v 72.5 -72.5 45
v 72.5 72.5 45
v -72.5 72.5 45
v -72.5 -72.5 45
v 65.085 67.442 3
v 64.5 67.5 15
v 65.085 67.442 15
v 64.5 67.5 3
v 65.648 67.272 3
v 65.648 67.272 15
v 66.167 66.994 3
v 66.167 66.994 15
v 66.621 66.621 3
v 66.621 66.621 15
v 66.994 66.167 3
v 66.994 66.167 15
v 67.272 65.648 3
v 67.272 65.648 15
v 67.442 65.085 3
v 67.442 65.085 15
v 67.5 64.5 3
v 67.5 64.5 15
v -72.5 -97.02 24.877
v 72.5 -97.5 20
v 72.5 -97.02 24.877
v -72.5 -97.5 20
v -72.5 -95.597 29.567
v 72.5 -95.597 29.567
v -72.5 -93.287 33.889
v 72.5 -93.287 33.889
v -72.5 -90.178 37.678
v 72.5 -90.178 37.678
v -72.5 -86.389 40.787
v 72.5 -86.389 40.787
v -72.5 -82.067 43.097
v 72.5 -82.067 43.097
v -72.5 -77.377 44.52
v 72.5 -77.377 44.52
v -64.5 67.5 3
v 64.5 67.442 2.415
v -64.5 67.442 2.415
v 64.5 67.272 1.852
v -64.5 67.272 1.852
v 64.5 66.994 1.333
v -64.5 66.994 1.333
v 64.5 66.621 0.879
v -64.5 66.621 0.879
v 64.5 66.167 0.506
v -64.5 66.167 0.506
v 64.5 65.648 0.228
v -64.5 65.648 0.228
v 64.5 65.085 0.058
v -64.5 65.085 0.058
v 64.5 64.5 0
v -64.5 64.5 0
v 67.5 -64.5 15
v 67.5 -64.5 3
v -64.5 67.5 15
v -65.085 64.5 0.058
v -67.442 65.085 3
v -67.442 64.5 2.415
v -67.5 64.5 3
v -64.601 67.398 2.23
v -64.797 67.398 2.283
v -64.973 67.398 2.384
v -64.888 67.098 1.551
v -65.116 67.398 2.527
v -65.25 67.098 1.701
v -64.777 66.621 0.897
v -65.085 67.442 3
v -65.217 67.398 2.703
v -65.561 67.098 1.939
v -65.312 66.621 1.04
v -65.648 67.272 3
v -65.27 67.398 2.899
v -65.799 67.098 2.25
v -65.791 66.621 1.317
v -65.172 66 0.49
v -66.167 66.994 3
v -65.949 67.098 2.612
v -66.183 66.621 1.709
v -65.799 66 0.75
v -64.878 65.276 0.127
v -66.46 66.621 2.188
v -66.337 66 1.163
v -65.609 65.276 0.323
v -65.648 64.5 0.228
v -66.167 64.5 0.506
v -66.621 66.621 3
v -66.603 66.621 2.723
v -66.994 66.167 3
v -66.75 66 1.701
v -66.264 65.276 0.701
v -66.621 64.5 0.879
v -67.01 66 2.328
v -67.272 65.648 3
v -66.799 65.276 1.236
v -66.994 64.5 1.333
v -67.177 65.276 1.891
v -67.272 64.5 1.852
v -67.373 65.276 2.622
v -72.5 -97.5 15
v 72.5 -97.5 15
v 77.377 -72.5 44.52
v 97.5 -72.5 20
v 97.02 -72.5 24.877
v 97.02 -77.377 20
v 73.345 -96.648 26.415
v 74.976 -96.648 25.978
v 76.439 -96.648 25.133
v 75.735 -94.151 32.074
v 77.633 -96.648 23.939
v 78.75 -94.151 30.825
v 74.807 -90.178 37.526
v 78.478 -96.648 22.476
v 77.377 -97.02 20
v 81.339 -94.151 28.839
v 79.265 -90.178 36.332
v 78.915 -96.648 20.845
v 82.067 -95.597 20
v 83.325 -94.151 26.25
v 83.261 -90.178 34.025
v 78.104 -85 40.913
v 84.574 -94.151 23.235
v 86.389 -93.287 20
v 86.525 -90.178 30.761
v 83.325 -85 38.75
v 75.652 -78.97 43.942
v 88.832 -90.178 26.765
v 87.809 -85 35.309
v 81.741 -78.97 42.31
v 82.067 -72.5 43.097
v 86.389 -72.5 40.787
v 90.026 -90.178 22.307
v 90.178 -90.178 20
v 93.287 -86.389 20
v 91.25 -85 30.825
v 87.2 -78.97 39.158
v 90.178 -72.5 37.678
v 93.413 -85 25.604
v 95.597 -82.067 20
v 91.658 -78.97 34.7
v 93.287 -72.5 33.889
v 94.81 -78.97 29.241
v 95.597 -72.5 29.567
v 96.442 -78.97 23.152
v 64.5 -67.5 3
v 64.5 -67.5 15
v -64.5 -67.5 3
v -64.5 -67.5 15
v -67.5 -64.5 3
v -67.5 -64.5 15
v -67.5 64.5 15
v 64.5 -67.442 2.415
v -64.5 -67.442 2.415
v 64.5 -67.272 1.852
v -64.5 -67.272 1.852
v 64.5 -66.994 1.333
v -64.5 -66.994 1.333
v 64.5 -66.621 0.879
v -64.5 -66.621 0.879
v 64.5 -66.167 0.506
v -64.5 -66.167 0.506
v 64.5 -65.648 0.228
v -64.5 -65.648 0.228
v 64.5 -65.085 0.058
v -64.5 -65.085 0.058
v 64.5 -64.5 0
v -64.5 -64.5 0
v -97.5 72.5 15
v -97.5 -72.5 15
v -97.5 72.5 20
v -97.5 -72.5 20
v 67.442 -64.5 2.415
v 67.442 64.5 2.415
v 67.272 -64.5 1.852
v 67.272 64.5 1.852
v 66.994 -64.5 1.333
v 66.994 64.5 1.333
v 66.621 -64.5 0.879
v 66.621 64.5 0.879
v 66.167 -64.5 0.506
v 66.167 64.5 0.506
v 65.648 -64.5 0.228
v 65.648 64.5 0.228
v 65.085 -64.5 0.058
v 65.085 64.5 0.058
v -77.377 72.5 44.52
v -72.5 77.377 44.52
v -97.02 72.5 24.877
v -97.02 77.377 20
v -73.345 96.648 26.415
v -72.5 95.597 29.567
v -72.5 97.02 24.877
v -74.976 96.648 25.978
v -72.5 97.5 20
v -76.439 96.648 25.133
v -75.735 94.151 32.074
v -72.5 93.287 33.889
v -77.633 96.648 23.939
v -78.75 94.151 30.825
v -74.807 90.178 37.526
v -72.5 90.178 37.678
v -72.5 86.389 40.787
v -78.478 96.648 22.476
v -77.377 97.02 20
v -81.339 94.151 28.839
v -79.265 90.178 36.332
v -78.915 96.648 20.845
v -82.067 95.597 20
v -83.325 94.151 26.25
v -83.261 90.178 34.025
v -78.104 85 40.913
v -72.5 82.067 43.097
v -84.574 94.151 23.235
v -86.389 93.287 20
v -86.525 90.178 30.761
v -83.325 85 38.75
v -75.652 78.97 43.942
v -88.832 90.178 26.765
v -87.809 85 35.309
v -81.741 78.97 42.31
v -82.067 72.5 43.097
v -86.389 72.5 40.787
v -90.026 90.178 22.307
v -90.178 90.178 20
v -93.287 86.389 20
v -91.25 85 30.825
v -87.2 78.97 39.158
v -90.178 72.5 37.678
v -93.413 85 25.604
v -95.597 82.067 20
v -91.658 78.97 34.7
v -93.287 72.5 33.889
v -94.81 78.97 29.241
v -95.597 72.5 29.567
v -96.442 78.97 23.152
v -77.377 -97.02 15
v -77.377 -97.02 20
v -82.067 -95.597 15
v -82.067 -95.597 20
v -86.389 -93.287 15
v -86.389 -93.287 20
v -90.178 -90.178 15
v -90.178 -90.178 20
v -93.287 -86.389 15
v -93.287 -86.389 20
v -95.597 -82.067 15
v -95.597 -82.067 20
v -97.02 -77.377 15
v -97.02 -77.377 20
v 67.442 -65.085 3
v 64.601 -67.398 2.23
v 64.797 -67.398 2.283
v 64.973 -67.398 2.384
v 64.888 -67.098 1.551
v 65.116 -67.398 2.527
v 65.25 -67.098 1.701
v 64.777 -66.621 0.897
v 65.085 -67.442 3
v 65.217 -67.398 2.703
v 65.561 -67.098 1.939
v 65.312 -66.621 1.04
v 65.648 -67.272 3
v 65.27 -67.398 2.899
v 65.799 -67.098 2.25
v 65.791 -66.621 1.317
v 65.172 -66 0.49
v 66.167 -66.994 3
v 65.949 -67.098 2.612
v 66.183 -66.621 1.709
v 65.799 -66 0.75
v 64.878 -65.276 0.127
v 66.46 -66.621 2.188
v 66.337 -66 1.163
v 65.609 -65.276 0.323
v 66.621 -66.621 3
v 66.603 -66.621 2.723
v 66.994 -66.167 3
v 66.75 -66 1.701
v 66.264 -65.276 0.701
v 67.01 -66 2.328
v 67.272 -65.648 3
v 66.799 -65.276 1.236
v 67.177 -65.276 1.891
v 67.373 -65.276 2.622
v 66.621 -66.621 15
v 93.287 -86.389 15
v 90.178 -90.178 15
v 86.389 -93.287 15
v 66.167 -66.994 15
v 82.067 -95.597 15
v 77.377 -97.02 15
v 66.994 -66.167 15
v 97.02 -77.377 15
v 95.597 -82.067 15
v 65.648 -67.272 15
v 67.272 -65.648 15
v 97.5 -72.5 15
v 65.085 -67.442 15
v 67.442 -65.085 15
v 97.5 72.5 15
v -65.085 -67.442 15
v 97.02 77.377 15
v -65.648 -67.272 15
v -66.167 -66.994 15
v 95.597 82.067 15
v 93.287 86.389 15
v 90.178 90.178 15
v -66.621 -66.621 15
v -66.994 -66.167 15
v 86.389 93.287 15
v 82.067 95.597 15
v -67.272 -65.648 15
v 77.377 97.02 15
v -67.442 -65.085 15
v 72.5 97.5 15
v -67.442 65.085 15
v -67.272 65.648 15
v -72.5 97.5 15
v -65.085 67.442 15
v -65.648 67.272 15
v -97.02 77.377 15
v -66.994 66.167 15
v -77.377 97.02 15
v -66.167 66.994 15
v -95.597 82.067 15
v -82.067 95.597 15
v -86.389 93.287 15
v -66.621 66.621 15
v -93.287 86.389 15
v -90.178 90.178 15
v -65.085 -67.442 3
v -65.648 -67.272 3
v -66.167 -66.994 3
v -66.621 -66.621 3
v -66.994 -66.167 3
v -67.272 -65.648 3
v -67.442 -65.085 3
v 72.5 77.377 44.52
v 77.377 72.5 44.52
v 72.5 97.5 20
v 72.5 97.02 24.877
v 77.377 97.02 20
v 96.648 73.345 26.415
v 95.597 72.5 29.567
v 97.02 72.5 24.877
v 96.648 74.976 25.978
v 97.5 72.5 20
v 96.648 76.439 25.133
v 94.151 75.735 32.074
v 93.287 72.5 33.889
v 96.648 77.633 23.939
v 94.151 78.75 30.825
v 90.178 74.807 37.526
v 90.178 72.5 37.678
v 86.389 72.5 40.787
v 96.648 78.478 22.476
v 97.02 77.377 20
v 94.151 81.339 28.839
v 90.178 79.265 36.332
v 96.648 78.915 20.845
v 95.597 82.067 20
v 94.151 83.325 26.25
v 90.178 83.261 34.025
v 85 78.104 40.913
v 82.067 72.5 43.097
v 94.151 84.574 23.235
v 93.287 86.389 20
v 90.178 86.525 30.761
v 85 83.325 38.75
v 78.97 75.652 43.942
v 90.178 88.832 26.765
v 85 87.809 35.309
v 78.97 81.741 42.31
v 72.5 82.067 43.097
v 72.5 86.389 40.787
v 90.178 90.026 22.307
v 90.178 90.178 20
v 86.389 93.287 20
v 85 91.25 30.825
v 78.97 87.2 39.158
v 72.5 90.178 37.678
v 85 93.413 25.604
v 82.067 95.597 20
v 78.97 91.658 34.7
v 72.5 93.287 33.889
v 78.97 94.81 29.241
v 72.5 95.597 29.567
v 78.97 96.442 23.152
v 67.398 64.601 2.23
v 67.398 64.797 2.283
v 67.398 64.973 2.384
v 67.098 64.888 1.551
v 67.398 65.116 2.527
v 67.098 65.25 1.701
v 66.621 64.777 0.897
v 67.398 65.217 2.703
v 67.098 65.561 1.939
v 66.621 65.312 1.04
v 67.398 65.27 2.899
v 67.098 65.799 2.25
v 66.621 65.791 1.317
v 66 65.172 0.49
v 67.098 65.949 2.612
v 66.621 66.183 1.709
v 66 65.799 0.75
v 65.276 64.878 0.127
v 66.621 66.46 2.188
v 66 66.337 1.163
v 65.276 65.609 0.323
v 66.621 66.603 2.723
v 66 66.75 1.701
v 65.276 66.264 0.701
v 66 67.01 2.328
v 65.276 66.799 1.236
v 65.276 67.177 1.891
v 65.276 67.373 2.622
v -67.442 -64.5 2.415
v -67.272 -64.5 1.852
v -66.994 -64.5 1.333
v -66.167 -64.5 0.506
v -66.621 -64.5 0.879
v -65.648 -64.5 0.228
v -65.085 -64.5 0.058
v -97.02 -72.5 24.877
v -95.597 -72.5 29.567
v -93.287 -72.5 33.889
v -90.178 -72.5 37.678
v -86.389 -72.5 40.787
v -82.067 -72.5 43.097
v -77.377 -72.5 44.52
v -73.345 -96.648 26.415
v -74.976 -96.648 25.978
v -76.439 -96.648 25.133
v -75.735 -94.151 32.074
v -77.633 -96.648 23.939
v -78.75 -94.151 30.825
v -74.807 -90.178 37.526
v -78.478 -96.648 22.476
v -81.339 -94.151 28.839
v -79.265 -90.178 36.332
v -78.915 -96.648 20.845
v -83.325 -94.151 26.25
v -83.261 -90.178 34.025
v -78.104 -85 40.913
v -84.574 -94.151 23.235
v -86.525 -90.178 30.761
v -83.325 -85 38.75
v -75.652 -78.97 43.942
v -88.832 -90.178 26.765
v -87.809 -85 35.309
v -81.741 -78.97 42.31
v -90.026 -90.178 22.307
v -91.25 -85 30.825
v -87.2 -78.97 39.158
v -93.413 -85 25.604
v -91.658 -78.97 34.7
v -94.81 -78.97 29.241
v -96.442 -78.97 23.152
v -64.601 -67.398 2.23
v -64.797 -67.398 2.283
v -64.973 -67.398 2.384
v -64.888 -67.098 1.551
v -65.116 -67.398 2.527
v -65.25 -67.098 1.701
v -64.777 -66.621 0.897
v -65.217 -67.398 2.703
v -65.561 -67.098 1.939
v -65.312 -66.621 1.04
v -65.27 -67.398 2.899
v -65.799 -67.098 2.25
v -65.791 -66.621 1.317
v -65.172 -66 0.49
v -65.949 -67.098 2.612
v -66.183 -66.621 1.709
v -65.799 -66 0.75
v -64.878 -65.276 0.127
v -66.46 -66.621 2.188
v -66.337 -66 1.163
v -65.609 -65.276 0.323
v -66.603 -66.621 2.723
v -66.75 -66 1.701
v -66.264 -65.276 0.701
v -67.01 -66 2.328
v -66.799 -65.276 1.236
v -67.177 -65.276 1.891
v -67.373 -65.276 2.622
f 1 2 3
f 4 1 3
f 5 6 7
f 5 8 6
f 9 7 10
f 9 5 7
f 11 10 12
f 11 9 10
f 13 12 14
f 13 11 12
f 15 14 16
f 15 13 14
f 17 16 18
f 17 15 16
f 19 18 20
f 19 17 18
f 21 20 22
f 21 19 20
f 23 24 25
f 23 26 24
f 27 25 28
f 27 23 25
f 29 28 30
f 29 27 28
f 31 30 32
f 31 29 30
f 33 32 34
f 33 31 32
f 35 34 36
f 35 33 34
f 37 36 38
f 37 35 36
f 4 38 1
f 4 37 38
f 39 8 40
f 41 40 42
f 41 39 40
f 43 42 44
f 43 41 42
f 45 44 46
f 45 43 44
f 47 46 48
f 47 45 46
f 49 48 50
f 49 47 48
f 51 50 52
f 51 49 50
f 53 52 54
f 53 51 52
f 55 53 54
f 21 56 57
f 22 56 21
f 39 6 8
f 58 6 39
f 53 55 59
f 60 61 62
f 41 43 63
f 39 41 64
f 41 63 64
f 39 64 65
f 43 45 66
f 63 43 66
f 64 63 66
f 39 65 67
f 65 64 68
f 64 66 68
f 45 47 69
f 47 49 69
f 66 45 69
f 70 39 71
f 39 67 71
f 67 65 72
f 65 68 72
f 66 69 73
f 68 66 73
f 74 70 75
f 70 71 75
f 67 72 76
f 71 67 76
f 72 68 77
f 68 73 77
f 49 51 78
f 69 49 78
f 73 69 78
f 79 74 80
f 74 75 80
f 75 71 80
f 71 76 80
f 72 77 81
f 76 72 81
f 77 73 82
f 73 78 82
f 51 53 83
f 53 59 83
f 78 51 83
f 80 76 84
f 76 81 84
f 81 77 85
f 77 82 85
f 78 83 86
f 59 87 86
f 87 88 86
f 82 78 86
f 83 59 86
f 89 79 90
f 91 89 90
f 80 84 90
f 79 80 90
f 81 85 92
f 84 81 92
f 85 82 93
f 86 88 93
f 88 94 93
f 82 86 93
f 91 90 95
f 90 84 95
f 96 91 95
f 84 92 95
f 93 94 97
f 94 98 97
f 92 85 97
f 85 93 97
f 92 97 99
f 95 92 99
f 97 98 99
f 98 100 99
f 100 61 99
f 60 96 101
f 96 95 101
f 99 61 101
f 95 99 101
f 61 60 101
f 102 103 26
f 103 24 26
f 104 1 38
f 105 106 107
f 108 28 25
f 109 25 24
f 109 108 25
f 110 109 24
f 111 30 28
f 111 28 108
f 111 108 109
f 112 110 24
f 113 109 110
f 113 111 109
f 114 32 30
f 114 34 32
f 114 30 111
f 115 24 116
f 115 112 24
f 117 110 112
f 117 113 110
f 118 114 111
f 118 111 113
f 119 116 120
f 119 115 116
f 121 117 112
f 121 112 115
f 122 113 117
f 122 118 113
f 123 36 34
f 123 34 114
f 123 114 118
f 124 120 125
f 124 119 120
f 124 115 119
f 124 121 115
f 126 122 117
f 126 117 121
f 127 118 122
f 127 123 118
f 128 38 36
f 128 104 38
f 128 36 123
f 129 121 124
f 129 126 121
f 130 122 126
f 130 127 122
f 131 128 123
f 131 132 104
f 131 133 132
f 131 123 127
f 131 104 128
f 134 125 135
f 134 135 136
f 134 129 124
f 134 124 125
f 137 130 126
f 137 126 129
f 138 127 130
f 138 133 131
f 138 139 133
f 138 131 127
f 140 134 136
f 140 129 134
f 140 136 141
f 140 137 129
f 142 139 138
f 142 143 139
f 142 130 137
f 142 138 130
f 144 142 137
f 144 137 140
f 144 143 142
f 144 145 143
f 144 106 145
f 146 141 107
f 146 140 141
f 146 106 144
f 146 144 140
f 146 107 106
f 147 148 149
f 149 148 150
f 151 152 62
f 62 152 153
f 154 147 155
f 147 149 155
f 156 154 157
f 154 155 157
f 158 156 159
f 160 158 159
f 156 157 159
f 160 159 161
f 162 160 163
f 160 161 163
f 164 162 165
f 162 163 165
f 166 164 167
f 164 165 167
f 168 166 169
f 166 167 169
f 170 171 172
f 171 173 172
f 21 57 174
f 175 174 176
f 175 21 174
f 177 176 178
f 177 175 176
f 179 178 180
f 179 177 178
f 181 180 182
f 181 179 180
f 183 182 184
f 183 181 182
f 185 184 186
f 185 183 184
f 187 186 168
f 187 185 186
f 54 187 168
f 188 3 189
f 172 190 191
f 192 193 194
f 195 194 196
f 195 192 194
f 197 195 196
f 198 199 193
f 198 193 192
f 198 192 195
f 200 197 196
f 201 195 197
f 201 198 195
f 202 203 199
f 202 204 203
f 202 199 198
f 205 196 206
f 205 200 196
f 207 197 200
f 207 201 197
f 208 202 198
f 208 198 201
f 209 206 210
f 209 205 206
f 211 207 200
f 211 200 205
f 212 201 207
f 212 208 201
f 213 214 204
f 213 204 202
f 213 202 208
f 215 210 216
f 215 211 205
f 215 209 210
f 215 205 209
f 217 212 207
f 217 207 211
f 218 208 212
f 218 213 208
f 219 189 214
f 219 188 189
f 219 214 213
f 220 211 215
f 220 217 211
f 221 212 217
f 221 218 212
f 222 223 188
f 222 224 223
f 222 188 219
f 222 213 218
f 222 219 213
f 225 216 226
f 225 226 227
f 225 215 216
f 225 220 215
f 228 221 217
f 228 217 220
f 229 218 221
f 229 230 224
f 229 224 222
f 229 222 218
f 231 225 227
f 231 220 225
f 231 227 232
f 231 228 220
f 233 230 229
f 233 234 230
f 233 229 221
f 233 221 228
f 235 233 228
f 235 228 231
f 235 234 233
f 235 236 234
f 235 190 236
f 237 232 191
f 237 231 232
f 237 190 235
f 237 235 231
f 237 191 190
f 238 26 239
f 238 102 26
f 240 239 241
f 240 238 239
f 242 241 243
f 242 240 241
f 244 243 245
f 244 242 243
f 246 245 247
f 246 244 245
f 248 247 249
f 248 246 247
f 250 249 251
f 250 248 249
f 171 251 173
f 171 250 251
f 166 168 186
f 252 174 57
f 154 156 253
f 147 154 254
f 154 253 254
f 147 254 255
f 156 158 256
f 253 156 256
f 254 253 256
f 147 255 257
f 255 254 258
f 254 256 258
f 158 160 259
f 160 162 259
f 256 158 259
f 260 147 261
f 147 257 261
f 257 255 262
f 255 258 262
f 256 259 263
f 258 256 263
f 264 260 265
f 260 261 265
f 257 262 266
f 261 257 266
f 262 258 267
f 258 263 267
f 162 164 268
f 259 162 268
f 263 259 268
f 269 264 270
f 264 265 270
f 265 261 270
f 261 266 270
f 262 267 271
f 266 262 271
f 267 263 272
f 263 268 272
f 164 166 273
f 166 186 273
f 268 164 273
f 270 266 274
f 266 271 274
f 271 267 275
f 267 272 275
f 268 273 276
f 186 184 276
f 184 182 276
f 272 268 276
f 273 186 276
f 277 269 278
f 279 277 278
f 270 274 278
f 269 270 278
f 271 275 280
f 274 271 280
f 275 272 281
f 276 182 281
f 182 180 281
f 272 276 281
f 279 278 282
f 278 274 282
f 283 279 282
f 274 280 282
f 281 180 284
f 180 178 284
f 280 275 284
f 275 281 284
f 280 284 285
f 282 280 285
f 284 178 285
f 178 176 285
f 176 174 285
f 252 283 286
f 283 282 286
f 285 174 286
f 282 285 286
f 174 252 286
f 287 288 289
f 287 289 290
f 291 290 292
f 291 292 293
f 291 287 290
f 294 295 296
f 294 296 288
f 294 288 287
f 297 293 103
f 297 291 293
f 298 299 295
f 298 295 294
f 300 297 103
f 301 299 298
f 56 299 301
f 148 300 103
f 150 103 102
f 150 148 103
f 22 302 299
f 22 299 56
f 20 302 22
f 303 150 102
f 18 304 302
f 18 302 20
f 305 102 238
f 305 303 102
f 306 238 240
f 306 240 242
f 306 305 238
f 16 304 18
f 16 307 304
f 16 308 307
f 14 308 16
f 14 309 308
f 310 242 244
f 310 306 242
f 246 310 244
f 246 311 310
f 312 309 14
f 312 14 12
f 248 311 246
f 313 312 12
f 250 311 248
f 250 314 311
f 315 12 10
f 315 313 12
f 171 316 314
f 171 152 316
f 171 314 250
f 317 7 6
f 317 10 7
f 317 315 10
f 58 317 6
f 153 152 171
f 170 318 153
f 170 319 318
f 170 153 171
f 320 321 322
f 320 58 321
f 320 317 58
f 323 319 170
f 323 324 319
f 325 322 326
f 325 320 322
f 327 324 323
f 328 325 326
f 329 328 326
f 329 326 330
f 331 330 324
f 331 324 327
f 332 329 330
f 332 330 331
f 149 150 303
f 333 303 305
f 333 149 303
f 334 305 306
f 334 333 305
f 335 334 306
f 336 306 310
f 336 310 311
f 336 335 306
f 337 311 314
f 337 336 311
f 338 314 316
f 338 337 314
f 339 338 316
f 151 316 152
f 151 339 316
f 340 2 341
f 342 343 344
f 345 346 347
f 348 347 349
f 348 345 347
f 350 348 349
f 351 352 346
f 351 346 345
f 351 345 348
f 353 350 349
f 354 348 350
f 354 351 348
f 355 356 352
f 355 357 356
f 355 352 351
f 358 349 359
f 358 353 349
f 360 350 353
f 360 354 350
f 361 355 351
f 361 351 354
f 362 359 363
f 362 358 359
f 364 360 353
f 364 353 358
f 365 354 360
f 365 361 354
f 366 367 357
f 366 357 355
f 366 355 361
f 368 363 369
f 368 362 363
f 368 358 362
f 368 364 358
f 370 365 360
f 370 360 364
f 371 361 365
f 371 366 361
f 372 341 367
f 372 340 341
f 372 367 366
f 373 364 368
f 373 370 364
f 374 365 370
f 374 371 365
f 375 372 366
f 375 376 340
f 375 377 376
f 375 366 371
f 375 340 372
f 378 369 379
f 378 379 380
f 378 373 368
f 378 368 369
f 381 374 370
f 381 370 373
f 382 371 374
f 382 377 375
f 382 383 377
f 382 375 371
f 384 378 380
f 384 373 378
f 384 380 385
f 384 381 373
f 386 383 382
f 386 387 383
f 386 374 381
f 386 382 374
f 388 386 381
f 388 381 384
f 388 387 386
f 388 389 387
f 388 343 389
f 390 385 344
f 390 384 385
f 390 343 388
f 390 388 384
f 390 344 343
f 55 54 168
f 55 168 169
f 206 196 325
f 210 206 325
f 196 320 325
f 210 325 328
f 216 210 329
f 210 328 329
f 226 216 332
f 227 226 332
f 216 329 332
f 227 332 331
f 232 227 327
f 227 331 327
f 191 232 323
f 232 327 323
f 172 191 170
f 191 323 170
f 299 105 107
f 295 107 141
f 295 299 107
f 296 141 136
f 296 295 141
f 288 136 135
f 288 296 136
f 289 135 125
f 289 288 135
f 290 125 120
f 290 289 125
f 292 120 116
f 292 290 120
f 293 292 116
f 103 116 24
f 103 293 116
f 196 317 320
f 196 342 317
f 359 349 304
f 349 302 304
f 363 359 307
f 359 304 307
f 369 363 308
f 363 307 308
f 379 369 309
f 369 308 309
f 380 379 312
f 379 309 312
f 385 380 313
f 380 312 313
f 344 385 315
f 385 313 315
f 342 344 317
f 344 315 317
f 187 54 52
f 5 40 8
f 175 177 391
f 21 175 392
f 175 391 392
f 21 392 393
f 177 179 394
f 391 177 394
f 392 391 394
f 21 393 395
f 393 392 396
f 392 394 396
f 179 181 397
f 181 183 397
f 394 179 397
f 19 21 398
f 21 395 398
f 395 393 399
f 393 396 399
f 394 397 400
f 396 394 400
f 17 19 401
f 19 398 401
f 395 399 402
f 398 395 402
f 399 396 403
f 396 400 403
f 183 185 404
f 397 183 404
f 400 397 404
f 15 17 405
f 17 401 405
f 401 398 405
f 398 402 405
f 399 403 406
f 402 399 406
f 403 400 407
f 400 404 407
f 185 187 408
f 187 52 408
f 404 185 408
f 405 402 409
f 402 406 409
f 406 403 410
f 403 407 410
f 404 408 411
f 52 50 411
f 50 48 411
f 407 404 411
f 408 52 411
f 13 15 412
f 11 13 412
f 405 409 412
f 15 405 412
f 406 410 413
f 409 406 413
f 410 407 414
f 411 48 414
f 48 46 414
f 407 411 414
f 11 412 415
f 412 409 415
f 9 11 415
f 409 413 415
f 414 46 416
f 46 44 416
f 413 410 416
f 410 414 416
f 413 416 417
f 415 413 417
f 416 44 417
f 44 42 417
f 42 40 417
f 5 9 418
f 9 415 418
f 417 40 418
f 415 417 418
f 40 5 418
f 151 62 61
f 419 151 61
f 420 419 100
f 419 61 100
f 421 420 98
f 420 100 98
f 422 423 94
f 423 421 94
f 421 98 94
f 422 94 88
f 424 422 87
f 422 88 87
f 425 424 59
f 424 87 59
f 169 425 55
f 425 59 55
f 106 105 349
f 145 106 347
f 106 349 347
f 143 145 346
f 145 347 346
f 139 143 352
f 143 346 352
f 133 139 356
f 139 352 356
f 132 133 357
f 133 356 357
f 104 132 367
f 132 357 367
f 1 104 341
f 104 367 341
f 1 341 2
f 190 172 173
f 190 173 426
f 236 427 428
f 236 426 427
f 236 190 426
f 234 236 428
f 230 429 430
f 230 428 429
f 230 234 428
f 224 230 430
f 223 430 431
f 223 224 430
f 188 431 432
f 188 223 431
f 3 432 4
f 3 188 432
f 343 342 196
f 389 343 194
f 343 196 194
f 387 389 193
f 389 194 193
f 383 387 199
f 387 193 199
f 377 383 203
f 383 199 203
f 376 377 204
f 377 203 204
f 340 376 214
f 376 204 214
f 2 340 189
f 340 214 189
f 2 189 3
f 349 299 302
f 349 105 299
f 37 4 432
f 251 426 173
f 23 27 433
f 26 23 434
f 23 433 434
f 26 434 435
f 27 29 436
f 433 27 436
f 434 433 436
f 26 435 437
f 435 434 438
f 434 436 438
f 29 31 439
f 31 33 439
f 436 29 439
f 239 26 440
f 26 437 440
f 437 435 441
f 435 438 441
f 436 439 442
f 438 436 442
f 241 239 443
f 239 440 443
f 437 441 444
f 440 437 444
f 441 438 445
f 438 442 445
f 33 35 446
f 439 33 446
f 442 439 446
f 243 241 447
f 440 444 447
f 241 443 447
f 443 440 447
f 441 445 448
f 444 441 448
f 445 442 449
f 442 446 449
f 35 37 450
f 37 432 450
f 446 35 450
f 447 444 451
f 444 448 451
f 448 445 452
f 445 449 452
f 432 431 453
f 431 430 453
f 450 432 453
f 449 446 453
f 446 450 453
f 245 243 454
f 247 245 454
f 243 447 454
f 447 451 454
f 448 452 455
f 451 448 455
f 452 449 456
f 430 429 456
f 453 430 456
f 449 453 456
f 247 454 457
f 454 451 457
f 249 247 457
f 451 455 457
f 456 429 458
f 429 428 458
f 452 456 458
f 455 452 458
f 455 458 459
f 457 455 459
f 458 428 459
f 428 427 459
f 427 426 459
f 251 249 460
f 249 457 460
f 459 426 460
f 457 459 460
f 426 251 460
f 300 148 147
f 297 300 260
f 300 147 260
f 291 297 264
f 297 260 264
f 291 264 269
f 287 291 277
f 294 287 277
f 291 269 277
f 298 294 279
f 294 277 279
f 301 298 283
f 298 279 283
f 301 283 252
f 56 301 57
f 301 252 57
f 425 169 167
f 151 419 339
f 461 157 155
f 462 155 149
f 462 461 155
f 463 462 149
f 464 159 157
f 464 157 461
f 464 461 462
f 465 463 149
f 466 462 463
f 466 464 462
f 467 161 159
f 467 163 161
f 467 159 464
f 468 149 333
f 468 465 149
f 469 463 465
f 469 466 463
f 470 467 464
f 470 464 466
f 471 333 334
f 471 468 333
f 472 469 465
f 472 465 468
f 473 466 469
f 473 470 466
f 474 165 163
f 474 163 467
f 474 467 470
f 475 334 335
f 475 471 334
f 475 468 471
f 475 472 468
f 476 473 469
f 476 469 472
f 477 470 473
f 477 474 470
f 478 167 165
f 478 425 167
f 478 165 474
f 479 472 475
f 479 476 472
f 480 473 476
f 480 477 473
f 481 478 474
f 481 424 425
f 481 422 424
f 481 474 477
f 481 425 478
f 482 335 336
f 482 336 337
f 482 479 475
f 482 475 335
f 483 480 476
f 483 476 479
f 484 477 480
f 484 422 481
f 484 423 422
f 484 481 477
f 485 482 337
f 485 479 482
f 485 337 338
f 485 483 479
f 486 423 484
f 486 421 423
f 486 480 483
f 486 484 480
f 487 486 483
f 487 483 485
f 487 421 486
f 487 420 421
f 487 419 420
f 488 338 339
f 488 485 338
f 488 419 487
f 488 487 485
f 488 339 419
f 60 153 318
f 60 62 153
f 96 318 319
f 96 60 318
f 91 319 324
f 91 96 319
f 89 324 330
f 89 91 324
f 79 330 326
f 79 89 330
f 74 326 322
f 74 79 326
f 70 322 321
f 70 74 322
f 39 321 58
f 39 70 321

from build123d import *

# Parameters (mm, degrees)
F0_W     = 195
F0_H     = 195
F1_DEPTH = 30
F2_W     = 135
F2_H     = 135
F3_DEPTH = 15
F4_R     = 3
F5_R     = 25
F6_ANGLE = 180


with BuildPart() as f1:
    # F0 (on Top) → F1 (new body)
    with BuildSketch(Plane.XY):
        Rectangle(F0_W, F0_H)
    extrude(amount=F1_DEPTH)

    # F2 (on face) → F3 (join)
    with BuildSketch(Plane.XY.offset(30)):
        Rectangle(F2_W, F2_H)
    extrude(amount=F3_DEPTH)

    # F4
    f4_edges = [f1.edges().sort_by_distance(p)[0] for p in [
        (67.5, 0, 45),
        (0, 67.5, 45),
        (-67.5, 0, 45),
        (0, -67.5, 45),
        (67.5, -67.5, 37.5),
        (67.5, 67.5, 37.5),
        (-67.5, -67.5, 37.5),
        (-67.5, 67.5, 37.5),
    ]]
    fillet(f4_edges, radius=F4_R)

    # F5
    f5_edges = [f1.edges().sort_by_distance(p)[0] for p in [
        (97.5, 0, 0),
        (0, 97.5, 0),
        (-97.5, 0, 0),
        (0, -97.5, 0),
        (97.5, 97.5, 15),
        (-97.5, 97.5, 15),
        (-97.5, -97.5, 15),
        (97.5, -97.5, 15),
    ]]
    fillet(f5_edges, radius=F5_R)


with BuildPart() as f1_1:
    # F6: moved
    add(f1.part.rotate(Axis((97.5, 0, 30), (0, -1, 0)), F6_ANGLE))


with BuildPart() as f1_2:
    # F7: moved
    add(f1_1.part.moved(Location((-195, 0, 0))))


with BuildPart() as f1_3:
    # F8: moved
    add(f1_2.part.moved(Location((0, 0, -15))))


solid = f1_3.part
